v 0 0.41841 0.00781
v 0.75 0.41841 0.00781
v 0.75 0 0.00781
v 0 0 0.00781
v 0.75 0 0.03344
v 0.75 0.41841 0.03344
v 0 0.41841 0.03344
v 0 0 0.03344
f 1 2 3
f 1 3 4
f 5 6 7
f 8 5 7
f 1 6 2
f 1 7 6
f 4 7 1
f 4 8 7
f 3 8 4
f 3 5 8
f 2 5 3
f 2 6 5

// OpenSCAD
EPS = 0.01;

translate([0, 0, 0.015625/2])
linear_extrude(height=0.015625 + EPS)
    polygon(points=[[0.75, 0.0], [0.75, 0.41842105263157897], [0.0, 0.41842105263157897], [0.0, 0.0]]);
